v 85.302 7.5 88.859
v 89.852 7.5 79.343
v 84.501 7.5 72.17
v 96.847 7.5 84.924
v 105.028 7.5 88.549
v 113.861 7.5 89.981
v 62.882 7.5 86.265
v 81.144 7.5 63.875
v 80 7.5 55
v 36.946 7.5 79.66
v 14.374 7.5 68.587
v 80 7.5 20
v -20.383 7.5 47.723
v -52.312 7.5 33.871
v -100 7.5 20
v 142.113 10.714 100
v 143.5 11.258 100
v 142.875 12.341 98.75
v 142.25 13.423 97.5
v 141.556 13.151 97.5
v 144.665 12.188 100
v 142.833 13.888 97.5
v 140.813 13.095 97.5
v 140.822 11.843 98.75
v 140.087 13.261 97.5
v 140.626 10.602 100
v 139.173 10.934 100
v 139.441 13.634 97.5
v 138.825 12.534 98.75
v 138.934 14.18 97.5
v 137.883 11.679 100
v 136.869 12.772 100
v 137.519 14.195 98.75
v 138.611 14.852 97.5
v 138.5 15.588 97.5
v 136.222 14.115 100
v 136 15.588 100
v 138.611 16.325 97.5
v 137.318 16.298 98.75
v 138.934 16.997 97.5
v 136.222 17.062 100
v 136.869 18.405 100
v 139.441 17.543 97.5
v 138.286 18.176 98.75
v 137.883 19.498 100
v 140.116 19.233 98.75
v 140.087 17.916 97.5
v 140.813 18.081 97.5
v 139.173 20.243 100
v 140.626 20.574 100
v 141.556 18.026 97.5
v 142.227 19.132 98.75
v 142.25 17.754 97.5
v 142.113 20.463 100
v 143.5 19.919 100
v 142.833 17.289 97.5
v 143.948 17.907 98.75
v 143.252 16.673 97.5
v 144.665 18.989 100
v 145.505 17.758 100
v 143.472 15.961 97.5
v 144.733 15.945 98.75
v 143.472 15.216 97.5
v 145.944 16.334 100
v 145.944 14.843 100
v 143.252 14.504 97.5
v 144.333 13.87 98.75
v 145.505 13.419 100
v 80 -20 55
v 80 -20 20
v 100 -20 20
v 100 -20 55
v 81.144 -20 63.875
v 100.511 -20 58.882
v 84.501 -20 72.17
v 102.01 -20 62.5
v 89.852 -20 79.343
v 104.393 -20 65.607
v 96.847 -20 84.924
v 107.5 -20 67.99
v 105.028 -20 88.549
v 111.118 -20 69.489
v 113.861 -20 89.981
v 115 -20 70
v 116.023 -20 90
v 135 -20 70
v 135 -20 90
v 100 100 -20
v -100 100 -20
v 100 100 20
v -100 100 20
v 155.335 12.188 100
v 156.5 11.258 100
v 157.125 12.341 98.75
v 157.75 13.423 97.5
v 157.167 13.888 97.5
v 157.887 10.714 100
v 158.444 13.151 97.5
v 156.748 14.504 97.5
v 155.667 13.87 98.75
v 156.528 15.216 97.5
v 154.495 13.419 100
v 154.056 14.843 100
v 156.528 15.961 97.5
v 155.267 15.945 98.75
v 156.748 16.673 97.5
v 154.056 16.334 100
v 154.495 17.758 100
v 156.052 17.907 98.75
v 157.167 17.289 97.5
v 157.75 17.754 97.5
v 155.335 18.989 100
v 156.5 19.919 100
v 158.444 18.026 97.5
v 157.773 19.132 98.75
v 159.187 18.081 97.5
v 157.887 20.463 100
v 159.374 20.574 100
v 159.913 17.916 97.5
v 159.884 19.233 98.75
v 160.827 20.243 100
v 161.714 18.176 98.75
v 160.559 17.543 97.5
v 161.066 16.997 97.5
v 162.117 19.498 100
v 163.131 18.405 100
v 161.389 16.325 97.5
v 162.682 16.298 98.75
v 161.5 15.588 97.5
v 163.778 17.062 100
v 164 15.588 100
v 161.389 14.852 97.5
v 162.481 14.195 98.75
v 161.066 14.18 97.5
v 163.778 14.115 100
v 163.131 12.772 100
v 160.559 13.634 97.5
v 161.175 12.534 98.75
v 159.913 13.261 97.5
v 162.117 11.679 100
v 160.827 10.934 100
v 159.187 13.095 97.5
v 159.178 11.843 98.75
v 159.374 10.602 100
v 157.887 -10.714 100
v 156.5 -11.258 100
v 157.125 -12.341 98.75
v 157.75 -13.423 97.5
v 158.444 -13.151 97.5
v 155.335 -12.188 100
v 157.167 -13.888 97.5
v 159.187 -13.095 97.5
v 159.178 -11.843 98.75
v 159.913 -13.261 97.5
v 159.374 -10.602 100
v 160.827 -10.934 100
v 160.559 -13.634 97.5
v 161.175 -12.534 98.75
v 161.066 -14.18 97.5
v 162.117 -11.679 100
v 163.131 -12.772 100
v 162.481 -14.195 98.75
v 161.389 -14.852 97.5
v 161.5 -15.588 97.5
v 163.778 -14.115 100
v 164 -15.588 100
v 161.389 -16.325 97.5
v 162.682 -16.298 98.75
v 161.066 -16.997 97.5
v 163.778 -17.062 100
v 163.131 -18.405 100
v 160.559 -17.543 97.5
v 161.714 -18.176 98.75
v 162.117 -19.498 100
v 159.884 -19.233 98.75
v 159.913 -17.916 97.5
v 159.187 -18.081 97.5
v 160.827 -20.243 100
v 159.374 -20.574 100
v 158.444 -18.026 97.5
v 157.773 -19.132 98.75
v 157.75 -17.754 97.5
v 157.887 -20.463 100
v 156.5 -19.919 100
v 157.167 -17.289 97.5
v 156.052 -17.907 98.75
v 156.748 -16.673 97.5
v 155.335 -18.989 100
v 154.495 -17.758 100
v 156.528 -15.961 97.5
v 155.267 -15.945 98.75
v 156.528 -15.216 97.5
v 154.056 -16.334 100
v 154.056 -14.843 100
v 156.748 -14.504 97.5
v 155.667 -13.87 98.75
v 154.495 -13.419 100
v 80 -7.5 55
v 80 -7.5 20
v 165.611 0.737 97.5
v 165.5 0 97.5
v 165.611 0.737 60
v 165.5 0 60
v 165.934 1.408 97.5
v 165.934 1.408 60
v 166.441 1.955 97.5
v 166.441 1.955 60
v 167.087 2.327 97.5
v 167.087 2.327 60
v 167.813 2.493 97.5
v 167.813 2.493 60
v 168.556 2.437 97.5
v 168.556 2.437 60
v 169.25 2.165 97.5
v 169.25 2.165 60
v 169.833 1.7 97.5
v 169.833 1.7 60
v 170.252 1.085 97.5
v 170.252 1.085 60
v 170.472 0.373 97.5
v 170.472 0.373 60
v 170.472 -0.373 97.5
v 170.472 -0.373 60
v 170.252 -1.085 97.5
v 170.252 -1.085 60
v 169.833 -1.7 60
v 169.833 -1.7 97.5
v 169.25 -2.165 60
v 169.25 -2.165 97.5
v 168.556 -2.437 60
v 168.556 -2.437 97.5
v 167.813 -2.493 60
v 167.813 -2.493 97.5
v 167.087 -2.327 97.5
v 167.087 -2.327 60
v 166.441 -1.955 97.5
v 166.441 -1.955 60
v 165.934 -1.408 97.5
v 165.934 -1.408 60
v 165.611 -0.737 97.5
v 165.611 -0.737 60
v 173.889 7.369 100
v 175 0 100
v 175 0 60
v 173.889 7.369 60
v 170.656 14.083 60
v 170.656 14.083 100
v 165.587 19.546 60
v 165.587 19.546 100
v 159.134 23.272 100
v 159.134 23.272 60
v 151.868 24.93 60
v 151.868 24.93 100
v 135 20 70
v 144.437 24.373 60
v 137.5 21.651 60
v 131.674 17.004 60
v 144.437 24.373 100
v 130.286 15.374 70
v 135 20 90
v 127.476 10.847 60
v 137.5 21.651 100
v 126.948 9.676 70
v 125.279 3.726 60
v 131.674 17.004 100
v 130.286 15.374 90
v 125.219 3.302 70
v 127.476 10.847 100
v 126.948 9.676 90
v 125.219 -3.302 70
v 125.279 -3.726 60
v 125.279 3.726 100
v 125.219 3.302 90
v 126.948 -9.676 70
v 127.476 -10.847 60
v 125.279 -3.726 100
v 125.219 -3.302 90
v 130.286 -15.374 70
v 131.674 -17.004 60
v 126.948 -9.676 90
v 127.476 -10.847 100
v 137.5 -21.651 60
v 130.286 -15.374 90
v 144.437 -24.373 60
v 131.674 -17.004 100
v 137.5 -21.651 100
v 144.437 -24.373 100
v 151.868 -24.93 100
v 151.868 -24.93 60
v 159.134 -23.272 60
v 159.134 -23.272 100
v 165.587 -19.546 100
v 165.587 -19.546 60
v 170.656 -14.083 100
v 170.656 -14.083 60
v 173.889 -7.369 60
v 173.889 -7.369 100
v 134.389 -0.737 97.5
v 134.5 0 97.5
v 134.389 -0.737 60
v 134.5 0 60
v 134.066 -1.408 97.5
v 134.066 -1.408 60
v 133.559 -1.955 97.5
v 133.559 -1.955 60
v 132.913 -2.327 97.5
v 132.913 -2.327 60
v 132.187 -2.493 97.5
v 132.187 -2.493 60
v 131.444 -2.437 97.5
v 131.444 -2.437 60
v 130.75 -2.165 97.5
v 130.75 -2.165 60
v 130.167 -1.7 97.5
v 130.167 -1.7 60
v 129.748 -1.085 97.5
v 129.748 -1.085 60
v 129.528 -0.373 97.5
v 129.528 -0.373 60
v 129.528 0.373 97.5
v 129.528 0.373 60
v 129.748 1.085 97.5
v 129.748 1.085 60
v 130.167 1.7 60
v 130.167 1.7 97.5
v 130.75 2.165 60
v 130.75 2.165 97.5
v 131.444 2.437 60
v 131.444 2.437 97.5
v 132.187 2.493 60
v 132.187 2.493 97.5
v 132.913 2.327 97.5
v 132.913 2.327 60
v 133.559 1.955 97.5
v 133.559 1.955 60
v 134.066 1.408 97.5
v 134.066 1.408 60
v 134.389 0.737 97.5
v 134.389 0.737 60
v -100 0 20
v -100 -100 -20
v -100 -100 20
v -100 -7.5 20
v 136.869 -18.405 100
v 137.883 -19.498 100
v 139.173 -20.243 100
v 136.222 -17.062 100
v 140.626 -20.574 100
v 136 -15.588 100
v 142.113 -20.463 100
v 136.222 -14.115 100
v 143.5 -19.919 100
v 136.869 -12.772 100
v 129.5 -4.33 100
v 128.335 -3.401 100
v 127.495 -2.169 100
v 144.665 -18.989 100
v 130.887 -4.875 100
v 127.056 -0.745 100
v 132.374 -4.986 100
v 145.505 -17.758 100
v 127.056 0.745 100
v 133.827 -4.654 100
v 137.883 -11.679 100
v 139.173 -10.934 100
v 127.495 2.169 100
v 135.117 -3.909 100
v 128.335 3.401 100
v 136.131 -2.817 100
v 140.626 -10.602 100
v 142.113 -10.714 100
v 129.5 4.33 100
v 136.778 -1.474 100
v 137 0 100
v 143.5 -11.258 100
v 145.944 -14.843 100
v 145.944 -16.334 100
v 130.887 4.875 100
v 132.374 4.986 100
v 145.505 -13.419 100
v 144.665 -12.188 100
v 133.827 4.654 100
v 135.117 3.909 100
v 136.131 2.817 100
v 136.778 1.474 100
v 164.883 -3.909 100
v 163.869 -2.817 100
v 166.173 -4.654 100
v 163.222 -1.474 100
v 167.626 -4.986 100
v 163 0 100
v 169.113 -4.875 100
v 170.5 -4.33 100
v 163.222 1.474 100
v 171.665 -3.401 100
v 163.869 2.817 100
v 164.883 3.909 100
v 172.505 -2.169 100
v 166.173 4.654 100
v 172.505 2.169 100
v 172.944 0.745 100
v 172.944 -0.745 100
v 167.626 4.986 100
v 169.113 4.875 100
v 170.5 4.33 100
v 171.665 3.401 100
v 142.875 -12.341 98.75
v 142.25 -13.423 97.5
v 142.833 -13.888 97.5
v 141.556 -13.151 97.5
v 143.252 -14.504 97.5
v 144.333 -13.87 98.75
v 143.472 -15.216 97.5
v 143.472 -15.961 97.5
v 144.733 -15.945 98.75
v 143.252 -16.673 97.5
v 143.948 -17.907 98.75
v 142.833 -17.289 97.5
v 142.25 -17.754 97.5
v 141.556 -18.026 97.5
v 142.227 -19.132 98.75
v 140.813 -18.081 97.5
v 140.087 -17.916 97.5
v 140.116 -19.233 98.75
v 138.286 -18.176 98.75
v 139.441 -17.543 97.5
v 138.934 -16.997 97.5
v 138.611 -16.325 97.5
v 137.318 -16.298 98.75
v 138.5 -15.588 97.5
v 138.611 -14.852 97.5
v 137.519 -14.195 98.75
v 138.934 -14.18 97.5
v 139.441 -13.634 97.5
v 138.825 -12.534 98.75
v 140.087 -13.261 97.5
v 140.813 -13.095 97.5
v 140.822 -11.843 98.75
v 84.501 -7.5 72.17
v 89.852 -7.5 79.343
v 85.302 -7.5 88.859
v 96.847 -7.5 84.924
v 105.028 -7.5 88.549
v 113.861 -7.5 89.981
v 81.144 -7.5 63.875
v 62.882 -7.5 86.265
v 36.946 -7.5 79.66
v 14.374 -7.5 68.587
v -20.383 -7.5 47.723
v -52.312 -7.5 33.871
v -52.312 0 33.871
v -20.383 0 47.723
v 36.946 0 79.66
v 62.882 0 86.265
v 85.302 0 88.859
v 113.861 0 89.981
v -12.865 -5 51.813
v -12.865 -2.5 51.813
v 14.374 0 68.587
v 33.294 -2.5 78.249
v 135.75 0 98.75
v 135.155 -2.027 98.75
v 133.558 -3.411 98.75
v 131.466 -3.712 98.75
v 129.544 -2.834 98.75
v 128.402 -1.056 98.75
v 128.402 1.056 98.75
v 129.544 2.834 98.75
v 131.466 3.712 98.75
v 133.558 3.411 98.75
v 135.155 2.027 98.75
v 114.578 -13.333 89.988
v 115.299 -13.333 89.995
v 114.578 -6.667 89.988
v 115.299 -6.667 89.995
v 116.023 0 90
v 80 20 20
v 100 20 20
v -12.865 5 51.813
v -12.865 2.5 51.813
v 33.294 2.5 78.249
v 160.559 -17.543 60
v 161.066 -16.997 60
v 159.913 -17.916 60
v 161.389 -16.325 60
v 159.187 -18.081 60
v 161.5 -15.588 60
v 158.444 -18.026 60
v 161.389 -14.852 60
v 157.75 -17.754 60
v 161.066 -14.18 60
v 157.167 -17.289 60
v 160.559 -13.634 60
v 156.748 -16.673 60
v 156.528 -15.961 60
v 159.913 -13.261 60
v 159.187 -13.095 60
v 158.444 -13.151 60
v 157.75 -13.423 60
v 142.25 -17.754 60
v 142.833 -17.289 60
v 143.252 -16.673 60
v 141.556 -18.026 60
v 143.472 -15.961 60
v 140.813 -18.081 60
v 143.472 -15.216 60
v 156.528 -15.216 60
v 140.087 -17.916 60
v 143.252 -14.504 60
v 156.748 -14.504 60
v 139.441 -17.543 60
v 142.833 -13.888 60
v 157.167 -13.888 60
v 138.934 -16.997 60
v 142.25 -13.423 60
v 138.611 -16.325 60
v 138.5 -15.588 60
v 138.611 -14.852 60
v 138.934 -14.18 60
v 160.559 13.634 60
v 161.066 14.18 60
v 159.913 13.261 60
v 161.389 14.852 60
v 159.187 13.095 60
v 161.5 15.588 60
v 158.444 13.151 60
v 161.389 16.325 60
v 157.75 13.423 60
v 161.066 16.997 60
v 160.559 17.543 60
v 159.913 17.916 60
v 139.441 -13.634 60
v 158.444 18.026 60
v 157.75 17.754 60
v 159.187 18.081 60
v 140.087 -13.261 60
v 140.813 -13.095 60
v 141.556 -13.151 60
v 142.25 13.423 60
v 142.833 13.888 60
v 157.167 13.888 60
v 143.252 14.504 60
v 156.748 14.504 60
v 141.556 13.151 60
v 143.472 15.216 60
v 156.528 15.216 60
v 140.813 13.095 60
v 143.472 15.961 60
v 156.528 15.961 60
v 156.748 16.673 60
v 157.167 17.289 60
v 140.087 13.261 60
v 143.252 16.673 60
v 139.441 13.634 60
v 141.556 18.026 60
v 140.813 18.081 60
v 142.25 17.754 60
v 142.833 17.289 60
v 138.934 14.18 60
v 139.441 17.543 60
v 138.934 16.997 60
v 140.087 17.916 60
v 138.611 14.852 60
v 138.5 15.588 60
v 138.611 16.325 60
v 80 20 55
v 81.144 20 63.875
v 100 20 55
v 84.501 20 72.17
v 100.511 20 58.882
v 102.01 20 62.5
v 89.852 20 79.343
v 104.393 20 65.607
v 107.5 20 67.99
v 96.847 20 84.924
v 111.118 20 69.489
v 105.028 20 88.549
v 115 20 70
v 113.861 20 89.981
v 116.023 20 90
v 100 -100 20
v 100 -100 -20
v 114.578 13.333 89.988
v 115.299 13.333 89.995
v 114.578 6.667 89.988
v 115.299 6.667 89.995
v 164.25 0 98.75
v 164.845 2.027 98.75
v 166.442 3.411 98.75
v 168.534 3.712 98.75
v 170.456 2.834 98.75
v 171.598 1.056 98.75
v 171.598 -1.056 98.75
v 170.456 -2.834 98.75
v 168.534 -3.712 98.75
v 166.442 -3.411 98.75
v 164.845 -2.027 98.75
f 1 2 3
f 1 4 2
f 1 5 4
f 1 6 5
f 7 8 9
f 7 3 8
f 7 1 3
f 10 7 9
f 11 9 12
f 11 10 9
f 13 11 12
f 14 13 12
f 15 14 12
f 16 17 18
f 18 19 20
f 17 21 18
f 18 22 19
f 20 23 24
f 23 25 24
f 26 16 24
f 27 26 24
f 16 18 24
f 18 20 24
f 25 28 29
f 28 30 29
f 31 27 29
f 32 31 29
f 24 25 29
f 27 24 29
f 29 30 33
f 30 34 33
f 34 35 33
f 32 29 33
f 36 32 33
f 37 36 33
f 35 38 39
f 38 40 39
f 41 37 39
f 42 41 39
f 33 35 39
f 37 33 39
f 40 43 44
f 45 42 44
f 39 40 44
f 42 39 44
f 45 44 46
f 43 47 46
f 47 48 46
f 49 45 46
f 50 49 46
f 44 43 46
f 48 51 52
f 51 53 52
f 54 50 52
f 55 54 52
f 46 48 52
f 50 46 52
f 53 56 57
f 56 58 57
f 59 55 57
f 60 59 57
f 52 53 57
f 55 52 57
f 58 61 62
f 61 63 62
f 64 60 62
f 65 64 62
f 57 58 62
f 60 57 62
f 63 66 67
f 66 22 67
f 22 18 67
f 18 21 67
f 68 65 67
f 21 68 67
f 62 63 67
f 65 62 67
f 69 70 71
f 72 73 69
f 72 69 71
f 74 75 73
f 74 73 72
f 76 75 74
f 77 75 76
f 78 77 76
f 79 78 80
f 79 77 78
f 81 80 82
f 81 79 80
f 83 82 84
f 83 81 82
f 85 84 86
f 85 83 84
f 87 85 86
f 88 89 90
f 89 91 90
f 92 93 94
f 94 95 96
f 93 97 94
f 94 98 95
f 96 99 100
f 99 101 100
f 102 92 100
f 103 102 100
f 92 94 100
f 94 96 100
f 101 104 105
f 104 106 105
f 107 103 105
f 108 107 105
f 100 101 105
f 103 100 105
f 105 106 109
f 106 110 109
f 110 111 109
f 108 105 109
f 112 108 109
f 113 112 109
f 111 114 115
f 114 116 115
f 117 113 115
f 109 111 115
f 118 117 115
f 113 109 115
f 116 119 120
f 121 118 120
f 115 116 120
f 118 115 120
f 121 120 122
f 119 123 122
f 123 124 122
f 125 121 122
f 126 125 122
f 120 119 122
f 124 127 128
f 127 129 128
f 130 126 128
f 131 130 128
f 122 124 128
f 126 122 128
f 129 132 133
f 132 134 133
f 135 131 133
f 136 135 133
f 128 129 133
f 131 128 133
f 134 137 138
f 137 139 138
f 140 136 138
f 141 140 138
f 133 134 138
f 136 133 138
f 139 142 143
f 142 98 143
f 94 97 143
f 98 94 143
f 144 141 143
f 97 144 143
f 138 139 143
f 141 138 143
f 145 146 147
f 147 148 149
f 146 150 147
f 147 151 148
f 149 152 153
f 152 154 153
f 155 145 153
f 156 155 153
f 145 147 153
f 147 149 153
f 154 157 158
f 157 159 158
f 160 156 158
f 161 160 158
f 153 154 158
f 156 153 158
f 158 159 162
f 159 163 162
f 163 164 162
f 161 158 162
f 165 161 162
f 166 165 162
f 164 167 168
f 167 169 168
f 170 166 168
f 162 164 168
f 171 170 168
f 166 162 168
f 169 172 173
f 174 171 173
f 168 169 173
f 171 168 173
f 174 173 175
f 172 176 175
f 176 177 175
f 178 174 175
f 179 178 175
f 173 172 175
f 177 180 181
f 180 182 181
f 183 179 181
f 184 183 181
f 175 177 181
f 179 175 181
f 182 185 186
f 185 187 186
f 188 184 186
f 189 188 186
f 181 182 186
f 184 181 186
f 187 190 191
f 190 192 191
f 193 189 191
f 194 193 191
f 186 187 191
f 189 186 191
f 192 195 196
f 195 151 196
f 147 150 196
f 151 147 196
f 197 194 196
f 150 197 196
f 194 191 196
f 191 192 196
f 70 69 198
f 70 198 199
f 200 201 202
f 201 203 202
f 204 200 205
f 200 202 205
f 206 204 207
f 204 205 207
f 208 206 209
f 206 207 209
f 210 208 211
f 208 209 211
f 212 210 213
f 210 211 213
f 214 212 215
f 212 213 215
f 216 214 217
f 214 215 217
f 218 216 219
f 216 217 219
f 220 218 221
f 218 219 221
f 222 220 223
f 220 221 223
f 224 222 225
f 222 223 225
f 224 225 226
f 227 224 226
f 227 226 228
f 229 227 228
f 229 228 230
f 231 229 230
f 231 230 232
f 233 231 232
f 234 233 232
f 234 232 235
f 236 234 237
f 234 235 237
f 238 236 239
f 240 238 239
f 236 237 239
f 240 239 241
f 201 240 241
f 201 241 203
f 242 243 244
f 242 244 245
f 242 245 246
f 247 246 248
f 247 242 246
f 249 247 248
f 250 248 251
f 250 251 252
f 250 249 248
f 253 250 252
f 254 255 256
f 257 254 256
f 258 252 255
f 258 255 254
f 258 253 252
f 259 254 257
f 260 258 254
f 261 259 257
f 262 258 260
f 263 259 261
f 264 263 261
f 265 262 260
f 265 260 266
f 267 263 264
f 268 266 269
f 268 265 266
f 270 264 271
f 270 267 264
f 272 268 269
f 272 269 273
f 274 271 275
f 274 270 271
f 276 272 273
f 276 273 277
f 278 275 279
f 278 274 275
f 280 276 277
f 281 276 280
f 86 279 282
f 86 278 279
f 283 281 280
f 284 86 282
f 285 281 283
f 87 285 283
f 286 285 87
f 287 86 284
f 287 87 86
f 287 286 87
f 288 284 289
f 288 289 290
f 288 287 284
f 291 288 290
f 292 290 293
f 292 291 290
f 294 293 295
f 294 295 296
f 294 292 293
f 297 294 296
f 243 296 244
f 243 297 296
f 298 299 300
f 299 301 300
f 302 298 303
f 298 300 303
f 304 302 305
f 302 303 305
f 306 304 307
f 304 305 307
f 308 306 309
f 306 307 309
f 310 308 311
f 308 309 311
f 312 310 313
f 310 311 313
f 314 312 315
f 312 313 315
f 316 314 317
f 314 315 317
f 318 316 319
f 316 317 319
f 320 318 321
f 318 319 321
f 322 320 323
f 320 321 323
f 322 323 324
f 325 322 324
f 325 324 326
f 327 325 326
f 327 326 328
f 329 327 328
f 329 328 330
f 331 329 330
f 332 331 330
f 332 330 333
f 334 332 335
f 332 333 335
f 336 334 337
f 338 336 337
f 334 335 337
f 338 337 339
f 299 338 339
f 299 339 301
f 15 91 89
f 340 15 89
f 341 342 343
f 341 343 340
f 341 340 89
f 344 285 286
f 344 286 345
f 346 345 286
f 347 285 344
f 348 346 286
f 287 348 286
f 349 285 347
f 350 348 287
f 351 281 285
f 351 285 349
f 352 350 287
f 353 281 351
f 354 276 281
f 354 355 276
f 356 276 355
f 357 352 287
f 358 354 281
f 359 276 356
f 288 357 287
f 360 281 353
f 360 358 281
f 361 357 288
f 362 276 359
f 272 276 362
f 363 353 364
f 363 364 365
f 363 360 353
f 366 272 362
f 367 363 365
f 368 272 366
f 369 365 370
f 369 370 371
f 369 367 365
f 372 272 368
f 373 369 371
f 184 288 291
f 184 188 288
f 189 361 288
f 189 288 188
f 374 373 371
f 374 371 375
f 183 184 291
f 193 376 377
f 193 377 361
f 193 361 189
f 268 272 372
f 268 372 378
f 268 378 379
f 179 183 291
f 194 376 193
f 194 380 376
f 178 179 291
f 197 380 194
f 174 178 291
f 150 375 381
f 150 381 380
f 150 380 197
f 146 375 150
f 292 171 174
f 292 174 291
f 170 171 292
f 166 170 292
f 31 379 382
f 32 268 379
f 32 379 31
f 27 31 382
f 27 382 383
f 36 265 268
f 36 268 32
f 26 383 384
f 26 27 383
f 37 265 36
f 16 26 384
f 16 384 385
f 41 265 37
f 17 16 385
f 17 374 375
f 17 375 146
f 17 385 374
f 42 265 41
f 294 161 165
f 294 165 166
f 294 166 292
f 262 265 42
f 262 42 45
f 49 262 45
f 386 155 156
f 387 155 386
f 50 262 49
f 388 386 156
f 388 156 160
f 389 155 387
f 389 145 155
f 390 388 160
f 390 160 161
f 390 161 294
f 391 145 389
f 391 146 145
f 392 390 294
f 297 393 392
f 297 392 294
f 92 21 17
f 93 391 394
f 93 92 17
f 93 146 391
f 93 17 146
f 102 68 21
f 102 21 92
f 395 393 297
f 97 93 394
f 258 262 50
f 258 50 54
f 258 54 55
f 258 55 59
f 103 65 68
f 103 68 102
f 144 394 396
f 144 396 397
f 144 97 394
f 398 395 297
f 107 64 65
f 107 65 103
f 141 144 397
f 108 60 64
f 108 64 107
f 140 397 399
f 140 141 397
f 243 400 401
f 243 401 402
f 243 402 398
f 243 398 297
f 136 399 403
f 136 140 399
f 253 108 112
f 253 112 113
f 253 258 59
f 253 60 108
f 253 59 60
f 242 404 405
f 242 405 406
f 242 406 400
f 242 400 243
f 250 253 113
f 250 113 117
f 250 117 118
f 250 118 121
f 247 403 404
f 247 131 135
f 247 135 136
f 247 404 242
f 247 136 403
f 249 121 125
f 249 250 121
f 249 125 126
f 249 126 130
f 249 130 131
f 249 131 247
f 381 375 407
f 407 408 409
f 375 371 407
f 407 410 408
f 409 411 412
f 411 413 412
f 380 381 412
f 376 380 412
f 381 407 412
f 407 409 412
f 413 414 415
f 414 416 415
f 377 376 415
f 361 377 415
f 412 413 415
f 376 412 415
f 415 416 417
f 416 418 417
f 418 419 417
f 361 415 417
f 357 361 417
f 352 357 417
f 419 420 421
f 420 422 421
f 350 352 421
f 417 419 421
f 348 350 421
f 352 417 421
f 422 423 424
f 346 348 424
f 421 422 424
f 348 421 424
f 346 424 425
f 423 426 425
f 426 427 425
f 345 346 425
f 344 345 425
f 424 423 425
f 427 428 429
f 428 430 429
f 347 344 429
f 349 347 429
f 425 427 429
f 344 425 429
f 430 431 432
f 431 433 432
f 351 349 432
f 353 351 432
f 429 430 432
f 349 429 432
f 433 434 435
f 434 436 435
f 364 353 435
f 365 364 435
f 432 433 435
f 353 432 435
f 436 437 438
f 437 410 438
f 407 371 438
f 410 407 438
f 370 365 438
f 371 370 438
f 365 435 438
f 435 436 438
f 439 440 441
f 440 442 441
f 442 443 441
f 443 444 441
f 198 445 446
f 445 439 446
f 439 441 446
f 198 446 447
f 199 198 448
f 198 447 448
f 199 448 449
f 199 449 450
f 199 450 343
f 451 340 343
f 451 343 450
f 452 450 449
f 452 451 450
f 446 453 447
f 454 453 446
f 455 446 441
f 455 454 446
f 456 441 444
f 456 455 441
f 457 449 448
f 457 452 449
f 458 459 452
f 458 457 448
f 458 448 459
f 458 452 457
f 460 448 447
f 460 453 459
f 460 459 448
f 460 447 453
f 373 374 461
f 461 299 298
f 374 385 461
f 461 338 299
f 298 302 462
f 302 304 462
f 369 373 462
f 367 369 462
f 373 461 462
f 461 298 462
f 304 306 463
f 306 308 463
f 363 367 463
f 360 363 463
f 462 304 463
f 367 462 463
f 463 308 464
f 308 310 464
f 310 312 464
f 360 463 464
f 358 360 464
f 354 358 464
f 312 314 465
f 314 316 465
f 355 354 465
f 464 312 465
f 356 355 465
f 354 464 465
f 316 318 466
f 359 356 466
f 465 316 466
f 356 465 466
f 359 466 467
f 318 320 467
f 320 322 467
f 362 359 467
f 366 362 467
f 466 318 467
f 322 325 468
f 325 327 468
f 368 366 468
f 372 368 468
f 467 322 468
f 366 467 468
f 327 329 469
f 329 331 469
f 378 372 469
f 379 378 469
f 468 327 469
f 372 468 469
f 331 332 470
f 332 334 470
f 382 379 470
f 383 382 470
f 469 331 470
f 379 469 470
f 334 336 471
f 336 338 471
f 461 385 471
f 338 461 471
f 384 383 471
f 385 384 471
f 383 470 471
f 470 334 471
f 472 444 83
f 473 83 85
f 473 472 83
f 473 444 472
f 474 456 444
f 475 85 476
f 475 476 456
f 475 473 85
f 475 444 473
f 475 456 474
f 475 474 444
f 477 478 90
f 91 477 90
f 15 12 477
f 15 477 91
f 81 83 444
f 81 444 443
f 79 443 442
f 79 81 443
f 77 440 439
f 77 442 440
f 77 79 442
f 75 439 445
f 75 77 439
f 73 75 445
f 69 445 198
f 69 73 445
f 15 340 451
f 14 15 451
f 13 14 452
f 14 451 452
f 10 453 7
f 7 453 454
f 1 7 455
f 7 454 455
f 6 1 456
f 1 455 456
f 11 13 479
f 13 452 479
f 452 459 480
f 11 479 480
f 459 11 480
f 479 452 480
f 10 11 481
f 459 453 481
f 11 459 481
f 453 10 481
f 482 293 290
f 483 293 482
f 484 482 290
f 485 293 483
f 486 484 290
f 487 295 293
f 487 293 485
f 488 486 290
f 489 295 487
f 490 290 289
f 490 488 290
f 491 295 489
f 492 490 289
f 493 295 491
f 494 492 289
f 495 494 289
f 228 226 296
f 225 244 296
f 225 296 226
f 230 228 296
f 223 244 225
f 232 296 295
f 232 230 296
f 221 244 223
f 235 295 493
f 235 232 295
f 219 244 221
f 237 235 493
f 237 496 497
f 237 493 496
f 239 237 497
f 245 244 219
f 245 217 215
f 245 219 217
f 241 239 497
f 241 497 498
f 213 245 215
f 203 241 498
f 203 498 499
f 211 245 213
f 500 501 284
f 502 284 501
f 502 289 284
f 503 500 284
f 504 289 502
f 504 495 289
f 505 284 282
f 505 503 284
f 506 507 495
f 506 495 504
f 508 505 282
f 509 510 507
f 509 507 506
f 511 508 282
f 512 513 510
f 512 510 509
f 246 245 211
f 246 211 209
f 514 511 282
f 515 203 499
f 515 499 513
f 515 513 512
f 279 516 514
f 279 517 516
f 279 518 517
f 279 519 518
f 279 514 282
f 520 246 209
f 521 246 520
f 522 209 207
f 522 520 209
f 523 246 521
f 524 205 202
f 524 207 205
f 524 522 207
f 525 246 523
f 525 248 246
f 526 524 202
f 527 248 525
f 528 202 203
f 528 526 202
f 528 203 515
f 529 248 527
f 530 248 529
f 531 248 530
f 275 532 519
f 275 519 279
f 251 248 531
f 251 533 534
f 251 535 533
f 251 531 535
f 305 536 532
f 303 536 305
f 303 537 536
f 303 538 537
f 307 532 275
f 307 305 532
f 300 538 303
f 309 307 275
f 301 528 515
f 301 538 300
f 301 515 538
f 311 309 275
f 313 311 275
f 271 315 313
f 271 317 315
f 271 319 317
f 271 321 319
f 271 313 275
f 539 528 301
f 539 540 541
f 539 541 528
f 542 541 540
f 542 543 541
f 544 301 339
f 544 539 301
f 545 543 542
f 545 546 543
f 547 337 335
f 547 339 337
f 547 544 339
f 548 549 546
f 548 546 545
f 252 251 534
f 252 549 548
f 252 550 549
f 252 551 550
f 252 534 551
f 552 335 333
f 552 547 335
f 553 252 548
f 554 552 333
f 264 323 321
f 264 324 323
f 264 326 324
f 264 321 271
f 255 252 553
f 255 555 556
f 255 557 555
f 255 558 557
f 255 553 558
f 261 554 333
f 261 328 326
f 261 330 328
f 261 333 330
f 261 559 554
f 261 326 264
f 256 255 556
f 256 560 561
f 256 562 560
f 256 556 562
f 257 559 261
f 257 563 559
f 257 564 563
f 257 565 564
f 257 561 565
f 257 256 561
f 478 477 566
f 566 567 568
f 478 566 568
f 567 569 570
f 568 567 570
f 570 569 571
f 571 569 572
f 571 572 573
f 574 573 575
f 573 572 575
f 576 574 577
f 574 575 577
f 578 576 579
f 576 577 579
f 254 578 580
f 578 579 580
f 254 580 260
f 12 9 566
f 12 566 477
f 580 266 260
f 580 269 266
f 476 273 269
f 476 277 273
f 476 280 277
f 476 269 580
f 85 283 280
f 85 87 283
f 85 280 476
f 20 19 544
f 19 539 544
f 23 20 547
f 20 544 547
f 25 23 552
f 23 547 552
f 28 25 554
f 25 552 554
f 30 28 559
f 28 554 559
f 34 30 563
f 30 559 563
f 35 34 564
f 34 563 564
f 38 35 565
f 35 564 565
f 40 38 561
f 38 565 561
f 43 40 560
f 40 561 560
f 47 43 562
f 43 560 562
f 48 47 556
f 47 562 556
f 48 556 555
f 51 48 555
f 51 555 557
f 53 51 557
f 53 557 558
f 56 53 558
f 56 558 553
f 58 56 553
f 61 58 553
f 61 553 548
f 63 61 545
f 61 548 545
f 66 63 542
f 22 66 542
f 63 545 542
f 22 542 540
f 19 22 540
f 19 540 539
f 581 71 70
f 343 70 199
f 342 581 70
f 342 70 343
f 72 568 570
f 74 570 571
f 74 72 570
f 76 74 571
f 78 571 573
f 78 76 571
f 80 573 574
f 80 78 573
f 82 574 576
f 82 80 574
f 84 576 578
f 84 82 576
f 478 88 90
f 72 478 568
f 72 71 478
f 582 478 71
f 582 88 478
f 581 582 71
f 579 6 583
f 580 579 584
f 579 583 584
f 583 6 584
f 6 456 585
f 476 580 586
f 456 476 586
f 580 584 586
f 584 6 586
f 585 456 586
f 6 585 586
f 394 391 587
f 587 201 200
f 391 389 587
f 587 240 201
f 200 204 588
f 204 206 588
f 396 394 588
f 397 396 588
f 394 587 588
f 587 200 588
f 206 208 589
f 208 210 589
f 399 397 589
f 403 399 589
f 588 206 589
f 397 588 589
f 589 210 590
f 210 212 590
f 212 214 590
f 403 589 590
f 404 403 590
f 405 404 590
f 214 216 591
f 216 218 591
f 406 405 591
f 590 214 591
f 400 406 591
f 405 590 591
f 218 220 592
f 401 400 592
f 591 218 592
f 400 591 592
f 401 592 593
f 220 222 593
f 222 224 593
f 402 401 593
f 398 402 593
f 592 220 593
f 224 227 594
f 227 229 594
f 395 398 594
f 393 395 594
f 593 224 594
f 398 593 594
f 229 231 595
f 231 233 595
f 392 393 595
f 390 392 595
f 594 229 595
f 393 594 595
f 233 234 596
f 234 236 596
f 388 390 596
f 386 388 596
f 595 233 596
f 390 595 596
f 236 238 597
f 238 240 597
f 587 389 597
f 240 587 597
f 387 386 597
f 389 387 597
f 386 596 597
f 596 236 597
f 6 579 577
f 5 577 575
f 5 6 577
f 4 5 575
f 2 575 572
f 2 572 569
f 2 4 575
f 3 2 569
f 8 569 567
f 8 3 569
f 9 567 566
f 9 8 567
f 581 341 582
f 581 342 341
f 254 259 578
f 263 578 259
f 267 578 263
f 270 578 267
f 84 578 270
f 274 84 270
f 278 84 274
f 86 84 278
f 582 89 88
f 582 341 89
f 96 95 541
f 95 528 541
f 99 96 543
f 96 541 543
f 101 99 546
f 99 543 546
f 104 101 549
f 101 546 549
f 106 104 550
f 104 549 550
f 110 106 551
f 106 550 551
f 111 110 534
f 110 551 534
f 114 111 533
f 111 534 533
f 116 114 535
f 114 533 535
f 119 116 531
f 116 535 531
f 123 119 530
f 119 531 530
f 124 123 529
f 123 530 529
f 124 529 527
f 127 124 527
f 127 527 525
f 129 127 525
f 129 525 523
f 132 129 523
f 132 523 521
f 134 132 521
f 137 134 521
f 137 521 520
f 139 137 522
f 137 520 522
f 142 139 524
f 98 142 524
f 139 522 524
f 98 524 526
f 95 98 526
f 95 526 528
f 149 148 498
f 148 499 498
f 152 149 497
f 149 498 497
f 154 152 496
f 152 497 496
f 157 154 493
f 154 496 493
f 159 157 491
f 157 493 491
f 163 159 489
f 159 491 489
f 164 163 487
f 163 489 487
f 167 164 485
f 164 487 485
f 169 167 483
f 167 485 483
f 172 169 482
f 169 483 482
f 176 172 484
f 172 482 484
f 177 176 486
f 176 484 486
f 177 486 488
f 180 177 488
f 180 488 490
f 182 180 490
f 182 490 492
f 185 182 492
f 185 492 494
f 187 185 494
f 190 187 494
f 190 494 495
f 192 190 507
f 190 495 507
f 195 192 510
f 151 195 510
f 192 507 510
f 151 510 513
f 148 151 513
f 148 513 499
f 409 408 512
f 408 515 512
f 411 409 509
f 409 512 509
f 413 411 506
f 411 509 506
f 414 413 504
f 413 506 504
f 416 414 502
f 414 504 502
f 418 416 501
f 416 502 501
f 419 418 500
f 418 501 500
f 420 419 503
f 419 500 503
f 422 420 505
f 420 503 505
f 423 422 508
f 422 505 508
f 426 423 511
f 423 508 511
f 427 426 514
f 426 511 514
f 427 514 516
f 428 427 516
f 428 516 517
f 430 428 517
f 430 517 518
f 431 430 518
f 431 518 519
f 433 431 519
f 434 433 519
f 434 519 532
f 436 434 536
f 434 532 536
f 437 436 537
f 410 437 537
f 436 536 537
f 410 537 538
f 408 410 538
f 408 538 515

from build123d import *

# Parameters (mm, degrees)
F1_DEPTH        = 100
F0_W            = 25
F0_H            = 20
F2_DEPTH        = 20
F3_DEPTH        = 7.5
F6_D            = 5
F6_CSINK_D      = 10
F6_CSINK_ANGLE  = 90
F6_COPIES_COUNT = 6


# Not quite as in the source:
# - a pattern or mirror of a feature is missing from the dataset's text; its kind, count and spacing are read off the source's solid


with BuildPart() as f1:
    # F0 (on Front) → F1 (new body, symmetric)
    with BuildSketch(Plane.XZ):
        Polygon((-100, -20), (100, -20), (100, 20), (80, 20), (-100, 20), align=None)
    extrude(amount=F1_DEPTH, both=True)

    # F0 (on Front) → F2 (join, symmetric)
    with BuildSketch(Plane.XZ):
        with BuildLine():
            Line((80, 20), (100, 20))
            Line((100, 20), (100, 55))
            ThreePointArc((100, 55), (104.3933982822, 65.6066017178), (115, 70))
            Line((115, 70), (125, 70))
            Line((125, 70), (125, 90))
            Line((125, 90), (116.0234387074, 90))
            add(Edge.make_bspline(
                [(113.8611942755, 89.9814682585), (114.576343668, 89.9888687938), (115.2970695321, 89.9950487976), (116.0234387074, 90)],
                knots=[228.983844188, 228.983844188, 228.983844188, 228.983844188, 230.3162896959, 230.3162896959, 230.3162896959, 230.3162896959], degree=3))
            ThreePointArc((113.8611942755, 89.9814682585), (89.8518569238, 79.3427792132), (80, 55))
            Line((80, 55), (80, 20))
        make_face()
        with Locations((137.5, 80)):
            Rectangle(F0_W, F0_H)
    extrude(amount=F2_DEPTH, both=True)

    # F0 (on Front) → F3 (join, symmetric)
    with BuildSketch(Plane.XZ):
        with BuildLine():
            add(Edge.make_bspline(
                [(-100, 20), (32.7521878521, 51.3916469178), (-9.0388838859, 88.7096691401), (113.8611942755, 89.9814682585)],
                knots=[0, 0, 0, 0, 228.983844188, 228.983844188, 228.983844188, 228.983844188], degree=3))
            Line((-100, 20), (80, 20))
            Line((80, 20), (80, 55))
            ThreePointArc((80, 55), (89.8518569238, 79.3427792132), (113.8611942755, 89.9814682585))
        make_face()
    extrude(amount=F3_DEPTH, both=True)

    # F0 (on Front) → F4 (revolve)
    with BuildSketch(Plane.XZ):
        Polygon((150, 90), (150, 70), (150, 60), (175, 60), (175, 100), (150, 100), align=None)
    revolve(axis=Axis((150, 0, 80), (0, 0, 1)))

    # F6 (through all)
    with Locations(Plane.XY.offset(100)):
        with Locations((168, 0)):
            f6 = CounterSinkHole(F6_D / 2, F6_CSINK_D / 2, counter_sink_angle=F6_CSINK_ANGLE)

    # F6_copies: F6 ×6 about axis
    f6_copies_axis = Axis((150, 0, 0), (0, 0, 1))
    for i in range(1, F6_COPIES_COUNT):
        add(f6.rotate(f6_copies_axis, i * 360 / F6_COPIES_COUNT), mode=Mode.SUBTRACT)


solid = f1.part
